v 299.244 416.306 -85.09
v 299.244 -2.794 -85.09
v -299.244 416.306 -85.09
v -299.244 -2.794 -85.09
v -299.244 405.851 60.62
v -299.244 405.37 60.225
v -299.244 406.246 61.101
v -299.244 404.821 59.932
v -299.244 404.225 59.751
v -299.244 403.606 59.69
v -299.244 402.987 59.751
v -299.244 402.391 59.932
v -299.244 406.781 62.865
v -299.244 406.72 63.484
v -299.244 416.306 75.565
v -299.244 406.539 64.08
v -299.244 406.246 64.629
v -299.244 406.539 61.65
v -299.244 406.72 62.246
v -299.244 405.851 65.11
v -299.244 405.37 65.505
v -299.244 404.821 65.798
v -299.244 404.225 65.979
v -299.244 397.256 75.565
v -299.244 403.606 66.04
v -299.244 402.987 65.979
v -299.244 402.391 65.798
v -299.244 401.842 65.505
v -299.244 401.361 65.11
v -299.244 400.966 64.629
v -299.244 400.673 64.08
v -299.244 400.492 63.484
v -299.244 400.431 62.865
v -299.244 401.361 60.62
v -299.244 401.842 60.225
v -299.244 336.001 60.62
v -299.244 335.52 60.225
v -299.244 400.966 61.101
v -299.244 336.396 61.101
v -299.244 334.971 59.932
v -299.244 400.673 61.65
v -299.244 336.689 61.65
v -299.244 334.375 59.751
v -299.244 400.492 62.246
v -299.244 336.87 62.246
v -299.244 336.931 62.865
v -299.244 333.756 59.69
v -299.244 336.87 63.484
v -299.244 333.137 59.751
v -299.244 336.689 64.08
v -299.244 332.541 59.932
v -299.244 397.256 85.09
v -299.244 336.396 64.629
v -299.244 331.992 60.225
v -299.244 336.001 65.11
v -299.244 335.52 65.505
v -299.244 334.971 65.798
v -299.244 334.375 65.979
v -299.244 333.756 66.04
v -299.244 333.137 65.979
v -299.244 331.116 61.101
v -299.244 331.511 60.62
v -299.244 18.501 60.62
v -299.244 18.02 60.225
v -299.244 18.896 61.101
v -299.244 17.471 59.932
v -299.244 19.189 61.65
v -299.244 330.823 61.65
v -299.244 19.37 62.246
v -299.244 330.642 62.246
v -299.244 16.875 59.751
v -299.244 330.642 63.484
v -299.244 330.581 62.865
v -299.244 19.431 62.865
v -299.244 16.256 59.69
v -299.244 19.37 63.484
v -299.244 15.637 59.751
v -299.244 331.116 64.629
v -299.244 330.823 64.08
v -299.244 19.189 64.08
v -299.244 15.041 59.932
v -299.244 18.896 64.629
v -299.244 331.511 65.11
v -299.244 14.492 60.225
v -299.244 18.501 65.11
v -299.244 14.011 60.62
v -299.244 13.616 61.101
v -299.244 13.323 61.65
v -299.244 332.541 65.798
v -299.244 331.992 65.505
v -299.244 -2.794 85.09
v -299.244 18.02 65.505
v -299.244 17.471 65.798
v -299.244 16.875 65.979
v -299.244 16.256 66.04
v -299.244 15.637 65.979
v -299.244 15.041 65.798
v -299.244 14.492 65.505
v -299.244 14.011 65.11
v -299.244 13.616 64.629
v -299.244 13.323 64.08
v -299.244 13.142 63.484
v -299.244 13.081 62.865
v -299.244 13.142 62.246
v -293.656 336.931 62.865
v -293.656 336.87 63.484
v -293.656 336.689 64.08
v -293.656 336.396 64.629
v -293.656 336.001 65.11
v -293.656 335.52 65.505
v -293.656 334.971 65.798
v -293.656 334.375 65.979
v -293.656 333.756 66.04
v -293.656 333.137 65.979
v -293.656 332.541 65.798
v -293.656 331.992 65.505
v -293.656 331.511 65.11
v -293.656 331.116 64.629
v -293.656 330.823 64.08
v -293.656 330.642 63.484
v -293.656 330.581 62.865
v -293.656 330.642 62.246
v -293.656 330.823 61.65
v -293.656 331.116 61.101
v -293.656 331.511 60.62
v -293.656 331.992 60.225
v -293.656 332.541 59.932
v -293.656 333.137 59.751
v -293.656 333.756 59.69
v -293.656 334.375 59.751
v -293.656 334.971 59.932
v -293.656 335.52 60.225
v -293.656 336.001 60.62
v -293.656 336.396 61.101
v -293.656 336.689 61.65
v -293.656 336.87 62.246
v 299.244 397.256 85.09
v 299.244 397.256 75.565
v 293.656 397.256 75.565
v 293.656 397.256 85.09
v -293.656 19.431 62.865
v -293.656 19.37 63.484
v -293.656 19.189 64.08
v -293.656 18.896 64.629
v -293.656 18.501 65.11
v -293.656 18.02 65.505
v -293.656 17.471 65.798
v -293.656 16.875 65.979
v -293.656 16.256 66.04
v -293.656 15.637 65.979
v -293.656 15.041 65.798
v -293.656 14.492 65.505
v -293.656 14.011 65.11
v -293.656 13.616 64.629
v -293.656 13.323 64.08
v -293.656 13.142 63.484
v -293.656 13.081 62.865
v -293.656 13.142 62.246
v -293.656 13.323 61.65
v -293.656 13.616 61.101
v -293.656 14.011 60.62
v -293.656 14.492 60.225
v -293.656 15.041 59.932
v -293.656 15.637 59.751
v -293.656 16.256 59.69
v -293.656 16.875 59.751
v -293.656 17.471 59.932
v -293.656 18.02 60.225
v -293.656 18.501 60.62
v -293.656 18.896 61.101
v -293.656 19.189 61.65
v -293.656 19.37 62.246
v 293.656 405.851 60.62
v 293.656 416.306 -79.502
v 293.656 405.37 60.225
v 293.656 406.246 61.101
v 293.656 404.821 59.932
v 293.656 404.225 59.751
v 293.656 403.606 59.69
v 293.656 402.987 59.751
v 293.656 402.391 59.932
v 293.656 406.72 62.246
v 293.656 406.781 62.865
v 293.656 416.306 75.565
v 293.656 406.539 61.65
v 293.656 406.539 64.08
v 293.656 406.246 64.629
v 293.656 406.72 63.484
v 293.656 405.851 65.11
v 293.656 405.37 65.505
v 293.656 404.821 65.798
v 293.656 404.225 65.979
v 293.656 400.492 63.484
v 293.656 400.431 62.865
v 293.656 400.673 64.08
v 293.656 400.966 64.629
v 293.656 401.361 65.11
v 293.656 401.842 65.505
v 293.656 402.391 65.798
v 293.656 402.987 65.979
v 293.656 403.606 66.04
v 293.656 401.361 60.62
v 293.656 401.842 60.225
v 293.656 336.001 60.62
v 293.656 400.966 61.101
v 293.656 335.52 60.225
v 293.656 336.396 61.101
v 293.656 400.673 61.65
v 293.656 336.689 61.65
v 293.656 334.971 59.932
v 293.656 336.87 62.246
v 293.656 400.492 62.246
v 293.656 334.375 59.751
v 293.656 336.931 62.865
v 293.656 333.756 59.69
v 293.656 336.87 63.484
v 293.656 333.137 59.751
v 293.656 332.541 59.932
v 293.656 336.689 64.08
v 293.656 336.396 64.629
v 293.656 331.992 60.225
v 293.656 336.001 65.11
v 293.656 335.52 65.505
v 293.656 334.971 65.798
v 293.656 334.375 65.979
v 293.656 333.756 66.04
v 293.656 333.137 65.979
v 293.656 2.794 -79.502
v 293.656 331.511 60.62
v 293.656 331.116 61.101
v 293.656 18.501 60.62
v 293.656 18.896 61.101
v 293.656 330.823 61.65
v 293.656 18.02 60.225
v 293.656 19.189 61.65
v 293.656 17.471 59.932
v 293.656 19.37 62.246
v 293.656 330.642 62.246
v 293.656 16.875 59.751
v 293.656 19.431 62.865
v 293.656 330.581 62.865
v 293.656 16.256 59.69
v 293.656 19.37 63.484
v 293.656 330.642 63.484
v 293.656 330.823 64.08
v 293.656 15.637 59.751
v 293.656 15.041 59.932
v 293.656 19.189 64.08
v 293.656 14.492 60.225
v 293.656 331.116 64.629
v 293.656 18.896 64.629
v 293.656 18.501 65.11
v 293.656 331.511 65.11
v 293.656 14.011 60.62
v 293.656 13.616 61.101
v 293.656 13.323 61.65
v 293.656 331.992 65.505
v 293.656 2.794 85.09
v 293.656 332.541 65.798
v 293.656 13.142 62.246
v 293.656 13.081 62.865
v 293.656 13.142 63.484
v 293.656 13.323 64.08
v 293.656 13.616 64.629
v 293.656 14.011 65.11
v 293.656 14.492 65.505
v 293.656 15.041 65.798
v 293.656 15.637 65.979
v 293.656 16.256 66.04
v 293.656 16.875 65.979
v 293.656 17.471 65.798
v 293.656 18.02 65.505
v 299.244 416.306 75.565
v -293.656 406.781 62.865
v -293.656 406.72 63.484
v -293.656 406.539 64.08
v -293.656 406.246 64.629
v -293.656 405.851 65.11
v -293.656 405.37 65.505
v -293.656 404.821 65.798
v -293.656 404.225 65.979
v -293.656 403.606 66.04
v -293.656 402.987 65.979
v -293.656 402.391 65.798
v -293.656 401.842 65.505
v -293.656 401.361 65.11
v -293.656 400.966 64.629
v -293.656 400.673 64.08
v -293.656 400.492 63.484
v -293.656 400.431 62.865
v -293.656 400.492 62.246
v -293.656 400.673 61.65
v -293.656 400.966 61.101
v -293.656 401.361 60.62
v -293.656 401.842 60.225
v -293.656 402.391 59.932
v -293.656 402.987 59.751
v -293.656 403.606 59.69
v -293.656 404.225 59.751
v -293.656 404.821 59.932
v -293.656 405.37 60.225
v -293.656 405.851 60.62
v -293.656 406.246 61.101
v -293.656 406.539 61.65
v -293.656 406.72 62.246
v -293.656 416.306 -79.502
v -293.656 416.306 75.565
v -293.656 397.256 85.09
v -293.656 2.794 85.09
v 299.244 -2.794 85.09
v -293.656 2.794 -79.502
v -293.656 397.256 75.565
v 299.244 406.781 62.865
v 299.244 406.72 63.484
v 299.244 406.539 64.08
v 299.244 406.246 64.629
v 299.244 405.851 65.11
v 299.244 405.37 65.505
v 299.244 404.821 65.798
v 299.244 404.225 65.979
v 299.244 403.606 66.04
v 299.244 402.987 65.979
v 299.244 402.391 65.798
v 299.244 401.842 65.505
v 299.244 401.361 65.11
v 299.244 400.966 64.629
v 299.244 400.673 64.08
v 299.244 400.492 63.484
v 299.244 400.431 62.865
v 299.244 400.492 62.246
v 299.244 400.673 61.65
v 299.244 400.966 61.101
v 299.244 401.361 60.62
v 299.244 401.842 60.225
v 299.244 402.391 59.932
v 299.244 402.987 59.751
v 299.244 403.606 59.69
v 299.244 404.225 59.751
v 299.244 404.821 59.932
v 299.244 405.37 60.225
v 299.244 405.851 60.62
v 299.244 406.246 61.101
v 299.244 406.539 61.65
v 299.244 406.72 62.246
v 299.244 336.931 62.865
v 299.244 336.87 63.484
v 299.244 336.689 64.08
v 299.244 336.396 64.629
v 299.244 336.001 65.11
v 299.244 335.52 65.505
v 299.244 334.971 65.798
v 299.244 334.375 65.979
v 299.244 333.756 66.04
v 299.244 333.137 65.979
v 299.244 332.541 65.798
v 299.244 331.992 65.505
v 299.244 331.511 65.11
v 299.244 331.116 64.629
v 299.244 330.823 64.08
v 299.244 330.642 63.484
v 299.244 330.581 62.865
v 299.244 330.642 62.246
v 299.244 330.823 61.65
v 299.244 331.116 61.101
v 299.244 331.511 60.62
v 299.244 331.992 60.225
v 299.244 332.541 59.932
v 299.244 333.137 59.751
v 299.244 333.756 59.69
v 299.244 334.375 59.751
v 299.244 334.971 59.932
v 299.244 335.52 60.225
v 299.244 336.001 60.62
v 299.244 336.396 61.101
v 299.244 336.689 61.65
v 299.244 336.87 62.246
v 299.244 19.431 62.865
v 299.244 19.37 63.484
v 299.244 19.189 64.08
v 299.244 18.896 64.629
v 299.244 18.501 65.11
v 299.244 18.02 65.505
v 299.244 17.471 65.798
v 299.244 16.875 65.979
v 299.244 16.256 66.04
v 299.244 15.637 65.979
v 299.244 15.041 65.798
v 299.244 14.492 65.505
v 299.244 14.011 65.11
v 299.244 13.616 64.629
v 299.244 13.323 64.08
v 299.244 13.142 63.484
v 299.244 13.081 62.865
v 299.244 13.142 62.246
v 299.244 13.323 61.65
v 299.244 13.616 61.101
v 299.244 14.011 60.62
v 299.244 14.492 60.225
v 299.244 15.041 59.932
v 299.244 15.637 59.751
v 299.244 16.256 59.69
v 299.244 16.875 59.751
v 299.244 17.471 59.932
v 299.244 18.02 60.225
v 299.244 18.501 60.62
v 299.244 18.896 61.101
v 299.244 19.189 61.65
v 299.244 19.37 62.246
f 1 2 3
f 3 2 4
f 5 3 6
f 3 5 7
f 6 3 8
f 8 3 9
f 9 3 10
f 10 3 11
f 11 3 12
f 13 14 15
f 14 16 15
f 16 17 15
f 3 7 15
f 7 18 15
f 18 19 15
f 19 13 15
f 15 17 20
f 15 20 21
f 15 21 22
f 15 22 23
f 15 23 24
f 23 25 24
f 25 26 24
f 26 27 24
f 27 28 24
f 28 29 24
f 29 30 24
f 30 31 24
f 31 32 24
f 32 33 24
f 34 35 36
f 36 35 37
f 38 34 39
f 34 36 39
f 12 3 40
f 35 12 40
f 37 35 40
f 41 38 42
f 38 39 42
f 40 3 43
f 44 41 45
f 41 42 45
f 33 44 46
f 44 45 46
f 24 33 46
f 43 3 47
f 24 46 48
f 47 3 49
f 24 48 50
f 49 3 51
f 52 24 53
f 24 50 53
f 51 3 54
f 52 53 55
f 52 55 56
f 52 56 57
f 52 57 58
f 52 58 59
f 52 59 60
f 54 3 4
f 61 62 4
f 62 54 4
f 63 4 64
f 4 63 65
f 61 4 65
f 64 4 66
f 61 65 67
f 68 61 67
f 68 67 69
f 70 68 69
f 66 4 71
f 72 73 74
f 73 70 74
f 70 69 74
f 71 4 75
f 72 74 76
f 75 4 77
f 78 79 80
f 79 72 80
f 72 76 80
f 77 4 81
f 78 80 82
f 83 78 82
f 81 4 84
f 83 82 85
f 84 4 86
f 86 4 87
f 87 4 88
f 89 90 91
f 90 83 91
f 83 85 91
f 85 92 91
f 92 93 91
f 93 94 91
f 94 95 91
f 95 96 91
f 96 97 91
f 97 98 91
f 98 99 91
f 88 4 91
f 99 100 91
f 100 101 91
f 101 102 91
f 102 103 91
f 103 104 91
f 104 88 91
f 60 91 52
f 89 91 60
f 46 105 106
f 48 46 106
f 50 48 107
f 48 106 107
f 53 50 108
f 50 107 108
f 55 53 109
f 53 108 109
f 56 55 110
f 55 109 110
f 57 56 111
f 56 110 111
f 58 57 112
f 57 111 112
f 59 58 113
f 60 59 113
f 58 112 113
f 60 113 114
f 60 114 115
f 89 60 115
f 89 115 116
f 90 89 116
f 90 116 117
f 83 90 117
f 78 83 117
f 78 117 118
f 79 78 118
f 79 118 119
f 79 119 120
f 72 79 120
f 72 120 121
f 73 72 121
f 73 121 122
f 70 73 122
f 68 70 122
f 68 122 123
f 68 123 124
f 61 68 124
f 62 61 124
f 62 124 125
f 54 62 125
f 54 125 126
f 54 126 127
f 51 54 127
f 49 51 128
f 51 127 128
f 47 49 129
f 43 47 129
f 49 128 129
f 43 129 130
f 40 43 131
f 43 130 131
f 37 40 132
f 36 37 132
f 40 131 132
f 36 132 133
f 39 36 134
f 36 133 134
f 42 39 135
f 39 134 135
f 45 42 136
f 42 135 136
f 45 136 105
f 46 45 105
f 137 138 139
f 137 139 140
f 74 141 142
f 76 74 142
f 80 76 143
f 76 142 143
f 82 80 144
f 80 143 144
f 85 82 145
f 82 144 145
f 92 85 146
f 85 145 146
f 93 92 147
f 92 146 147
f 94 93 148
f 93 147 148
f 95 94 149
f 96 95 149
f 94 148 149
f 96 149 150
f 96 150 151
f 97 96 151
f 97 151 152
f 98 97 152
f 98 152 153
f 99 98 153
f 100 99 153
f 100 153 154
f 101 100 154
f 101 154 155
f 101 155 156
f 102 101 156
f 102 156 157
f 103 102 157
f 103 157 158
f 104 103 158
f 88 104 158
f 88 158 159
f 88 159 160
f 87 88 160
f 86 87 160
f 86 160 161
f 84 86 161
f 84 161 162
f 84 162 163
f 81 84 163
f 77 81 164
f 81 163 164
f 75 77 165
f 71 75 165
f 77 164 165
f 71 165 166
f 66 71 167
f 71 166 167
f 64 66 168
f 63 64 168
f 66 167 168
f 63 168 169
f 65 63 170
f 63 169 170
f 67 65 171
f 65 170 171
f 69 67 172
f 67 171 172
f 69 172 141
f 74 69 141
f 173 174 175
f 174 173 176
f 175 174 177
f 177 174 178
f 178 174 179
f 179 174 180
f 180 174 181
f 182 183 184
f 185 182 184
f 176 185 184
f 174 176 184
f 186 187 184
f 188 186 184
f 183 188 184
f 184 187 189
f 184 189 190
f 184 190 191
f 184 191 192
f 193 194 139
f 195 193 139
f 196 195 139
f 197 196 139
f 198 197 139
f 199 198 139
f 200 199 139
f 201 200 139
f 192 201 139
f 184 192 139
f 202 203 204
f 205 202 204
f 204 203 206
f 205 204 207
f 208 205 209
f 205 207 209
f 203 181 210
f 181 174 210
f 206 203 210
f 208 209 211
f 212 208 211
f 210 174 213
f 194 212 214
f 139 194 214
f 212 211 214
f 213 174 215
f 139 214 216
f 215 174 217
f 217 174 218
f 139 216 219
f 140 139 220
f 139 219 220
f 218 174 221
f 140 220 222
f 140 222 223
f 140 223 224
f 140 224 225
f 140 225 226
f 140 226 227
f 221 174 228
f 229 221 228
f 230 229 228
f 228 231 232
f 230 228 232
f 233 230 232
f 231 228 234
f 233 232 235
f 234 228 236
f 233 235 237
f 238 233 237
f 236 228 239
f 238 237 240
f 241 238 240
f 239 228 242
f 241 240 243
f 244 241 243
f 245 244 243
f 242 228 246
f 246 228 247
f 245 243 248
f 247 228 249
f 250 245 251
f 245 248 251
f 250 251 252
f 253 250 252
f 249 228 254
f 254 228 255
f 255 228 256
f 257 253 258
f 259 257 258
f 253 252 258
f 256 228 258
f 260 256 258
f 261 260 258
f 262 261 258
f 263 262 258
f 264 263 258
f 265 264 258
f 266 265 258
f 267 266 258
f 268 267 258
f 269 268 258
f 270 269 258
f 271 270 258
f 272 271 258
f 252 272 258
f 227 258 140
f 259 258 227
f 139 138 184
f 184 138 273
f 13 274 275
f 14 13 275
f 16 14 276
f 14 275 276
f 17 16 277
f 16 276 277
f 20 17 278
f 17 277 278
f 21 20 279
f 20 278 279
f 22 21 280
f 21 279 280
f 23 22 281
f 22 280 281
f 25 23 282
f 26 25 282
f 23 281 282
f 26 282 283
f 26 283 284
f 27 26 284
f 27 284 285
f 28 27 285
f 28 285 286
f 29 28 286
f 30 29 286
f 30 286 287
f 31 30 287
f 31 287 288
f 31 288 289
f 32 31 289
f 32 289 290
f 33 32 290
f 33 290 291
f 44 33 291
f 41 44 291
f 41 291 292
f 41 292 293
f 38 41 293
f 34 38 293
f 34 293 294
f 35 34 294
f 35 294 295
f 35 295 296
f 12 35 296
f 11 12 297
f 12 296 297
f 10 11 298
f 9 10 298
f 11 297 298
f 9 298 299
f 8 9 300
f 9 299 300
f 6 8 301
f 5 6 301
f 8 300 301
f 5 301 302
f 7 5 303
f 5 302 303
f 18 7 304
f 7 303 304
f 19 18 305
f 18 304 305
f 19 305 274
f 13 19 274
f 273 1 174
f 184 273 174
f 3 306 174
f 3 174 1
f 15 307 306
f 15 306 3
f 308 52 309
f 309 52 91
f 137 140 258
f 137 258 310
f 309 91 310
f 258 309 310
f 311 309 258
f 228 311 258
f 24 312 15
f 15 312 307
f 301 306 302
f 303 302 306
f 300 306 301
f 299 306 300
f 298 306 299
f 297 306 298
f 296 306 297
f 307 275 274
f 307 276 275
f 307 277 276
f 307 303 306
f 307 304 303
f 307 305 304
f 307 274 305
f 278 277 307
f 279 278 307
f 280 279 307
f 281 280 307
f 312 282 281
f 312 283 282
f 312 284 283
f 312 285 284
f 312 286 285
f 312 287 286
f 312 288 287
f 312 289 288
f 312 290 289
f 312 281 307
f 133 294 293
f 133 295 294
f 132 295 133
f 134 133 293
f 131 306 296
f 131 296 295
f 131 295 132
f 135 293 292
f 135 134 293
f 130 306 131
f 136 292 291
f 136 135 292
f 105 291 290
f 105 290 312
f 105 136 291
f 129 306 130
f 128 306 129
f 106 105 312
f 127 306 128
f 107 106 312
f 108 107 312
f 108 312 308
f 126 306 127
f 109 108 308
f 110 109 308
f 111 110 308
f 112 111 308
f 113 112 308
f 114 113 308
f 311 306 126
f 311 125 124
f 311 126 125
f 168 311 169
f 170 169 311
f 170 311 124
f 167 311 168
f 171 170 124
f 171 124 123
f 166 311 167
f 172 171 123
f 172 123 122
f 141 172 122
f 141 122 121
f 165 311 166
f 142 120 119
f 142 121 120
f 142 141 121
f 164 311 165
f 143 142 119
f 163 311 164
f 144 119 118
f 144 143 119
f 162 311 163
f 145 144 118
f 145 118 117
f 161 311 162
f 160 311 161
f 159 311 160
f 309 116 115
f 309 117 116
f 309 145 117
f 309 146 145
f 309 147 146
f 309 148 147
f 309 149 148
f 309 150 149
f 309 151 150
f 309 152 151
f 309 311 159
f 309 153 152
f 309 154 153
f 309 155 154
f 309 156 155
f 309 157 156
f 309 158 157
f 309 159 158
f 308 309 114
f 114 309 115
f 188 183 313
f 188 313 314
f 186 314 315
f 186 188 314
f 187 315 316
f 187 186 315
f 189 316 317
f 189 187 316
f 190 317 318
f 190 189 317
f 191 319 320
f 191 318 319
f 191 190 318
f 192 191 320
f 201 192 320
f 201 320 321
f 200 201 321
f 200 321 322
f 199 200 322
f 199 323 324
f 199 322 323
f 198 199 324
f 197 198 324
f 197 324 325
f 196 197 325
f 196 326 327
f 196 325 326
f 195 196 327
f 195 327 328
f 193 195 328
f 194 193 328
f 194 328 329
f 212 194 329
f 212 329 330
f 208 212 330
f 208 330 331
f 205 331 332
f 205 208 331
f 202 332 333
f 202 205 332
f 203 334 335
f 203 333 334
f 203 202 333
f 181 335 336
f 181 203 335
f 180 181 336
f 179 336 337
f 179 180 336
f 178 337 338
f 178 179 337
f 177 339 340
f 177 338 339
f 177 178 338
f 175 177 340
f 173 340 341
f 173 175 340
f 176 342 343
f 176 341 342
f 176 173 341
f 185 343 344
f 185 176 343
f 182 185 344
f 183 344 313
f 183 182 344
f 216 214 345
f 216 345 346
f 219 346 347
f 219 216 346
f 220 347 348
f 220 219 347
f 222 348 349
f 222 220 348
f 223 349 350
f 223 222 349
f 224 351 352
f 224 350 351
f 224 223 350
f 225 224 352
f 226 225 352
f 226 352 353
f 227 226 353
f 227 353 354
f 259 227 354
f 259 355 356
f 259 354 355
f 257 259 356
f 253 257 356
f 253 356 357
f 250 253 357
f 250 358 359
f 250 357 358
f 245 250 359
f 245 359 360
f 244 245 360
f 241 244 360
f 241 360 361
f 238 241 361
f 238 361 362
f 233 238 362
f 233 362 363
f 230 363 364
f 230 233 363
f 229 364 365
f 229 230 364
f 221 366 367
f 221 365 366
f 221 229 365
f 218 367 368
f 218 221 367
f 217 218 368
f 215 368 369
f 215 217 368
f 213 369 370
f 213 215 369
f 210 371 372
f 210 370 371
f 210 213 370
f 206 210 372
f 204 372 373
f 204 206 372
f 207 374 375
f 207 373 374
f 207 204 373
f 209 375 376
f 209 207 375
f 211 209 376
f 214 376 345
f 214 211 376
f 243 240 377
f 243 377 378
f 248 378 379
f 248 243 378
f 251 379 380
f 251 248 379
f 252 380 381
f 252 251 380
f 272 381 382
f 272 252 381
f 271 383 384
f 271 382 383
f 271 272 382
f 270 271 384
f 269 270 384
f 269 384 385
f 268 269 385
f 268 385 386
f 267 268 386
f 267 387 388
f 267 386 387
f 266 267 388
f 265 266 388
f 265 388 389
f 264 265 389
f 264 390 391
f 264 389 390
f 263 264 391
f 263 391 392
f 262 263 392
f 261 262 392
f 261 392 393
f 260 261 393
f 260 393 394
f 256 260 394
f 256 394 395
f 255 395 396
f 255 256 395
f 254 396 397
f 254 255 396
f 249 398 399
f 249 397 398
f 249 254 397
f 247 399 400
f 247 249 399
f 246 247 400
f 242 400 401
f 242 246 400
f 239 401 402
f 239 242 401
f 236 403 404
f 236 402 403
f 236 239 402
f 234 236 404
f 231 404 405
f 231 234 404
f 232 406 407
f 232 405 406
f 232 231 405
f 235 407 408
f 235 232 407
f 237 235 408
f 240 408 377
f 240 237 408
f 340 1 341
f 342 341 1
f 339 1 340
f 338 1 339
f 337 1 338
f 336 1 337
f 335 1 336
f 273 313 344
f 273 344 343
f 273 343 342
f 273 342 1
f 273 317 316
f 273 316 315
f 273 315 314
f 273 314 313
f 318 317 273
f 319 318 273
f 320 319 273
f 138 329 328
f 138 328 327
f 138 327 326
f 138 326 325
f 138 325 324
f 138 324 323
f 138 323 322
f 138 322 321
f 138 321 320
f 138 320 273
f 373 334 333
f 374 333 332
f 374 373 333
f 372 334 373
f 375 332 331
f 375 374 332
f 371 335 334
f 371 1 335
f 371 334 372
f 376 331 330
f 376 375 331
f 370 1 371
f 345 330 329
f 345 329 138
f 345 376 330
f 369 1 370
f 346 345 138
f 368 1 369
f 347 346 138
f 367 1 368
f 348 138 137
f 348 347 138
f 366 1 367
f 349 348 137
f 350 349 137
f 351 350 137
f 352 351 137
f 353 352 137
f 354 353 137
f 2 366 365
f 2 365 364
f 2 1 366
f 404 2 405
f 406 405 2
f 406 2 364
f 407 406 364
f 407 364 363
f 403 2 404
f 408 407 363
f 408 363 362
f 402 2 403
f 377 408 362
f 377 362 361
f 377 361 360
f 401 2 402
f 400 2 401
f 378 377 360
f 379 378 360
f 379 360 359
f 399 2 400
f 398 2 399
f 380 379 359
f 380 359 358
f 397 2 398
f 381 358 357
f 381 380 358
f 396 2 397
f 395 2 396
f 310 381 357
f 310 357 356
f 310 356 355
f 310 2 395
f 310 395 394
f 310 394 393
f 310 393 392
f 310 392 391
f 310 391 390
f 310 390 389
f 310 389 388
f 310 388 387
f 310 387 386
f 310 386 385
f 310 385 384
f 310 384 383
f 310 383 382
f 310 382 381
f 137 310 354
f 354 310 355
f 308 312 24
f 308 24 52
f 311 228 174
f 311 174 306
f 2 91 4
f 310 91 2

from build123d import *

# Parameters (mm, degrees)
F0_W          = 598.4875
F0_H          = 170.18
F1_DEPTH      = 2.794
F2_W          = 5.588
F2_H          = 170.18
F3_DEPTH      = 419.1
F4_W          = 587.3115
F4_H          = 5.588
F5_DEPTH      = 413.512
F6_W          = 19.05
F6_H          = 9.525
F7_DEPTH      = 598.4885
F8_R          = 3.175
F9_DEPTH      = 5.589
F9_DEPTH_BACK = 592.9005


with BuildPart() as f1:
    # F0 (on Front) → F1 (new body, symmetric)
    with BuildSketch(Plane.XZ):
        Rectangle(F0_W, F0_H)
    extrude(amount=F1_DEPTH, both=True)

    # F2 (on face) → F3 (join)
    with BuildSketch(Plane.XZ.offset(2.794)):
        with Locations((-296.44975, 0)):
            Rectangle(F2_W, F2_H)
        with Locations((296.44975, 0)):
            Rectangle(F2_W, F2_H)
    extrude(amount=-F3_DEPTH)

    # F4 (on face) → F5 (join, through all)
    with BuildSketch(Plane(origin=(0, 2.794, 0), x_dir=(-1, 0, 0), z_dir=(0, 1, 0))):
        with Locations((0, -82.296)):
            Rectangle(F4_W, F4_H)
    extrude(amount=F5_DEPTH)

    # F6 (on face) → F7 (cut, through all)
    with BuildSketch(Plane.YZ.offset(299.24375)):
        with Locations((406.781, 80.3275)):
            Rectangle(F6_W, F6_H)
    extrude(amount=-F7_DEPTH, mode=Mode.SUBTRACT)

    # F8 (on face) → F9 (cut, two sides)
    with BuildSketch(Plane.YZ.offset(-293.65575)) as f9_sk:
        with Locations((403.606, 62.865)):
            Circle(F8_R)
        with Locations((333.756, 62.865)):
            Circle(F8_R)
        with Locations((16.256, 62.865)):
            Circle(F8_R)
    extrude(amount=-F9_DEPTH, mode=Mode.SUBTRACT)
    extrude(f9_sk.sketch, amount=F9_DEPTH_BACK, mode=Mode.SUBTRACT)


solid = f1.part
